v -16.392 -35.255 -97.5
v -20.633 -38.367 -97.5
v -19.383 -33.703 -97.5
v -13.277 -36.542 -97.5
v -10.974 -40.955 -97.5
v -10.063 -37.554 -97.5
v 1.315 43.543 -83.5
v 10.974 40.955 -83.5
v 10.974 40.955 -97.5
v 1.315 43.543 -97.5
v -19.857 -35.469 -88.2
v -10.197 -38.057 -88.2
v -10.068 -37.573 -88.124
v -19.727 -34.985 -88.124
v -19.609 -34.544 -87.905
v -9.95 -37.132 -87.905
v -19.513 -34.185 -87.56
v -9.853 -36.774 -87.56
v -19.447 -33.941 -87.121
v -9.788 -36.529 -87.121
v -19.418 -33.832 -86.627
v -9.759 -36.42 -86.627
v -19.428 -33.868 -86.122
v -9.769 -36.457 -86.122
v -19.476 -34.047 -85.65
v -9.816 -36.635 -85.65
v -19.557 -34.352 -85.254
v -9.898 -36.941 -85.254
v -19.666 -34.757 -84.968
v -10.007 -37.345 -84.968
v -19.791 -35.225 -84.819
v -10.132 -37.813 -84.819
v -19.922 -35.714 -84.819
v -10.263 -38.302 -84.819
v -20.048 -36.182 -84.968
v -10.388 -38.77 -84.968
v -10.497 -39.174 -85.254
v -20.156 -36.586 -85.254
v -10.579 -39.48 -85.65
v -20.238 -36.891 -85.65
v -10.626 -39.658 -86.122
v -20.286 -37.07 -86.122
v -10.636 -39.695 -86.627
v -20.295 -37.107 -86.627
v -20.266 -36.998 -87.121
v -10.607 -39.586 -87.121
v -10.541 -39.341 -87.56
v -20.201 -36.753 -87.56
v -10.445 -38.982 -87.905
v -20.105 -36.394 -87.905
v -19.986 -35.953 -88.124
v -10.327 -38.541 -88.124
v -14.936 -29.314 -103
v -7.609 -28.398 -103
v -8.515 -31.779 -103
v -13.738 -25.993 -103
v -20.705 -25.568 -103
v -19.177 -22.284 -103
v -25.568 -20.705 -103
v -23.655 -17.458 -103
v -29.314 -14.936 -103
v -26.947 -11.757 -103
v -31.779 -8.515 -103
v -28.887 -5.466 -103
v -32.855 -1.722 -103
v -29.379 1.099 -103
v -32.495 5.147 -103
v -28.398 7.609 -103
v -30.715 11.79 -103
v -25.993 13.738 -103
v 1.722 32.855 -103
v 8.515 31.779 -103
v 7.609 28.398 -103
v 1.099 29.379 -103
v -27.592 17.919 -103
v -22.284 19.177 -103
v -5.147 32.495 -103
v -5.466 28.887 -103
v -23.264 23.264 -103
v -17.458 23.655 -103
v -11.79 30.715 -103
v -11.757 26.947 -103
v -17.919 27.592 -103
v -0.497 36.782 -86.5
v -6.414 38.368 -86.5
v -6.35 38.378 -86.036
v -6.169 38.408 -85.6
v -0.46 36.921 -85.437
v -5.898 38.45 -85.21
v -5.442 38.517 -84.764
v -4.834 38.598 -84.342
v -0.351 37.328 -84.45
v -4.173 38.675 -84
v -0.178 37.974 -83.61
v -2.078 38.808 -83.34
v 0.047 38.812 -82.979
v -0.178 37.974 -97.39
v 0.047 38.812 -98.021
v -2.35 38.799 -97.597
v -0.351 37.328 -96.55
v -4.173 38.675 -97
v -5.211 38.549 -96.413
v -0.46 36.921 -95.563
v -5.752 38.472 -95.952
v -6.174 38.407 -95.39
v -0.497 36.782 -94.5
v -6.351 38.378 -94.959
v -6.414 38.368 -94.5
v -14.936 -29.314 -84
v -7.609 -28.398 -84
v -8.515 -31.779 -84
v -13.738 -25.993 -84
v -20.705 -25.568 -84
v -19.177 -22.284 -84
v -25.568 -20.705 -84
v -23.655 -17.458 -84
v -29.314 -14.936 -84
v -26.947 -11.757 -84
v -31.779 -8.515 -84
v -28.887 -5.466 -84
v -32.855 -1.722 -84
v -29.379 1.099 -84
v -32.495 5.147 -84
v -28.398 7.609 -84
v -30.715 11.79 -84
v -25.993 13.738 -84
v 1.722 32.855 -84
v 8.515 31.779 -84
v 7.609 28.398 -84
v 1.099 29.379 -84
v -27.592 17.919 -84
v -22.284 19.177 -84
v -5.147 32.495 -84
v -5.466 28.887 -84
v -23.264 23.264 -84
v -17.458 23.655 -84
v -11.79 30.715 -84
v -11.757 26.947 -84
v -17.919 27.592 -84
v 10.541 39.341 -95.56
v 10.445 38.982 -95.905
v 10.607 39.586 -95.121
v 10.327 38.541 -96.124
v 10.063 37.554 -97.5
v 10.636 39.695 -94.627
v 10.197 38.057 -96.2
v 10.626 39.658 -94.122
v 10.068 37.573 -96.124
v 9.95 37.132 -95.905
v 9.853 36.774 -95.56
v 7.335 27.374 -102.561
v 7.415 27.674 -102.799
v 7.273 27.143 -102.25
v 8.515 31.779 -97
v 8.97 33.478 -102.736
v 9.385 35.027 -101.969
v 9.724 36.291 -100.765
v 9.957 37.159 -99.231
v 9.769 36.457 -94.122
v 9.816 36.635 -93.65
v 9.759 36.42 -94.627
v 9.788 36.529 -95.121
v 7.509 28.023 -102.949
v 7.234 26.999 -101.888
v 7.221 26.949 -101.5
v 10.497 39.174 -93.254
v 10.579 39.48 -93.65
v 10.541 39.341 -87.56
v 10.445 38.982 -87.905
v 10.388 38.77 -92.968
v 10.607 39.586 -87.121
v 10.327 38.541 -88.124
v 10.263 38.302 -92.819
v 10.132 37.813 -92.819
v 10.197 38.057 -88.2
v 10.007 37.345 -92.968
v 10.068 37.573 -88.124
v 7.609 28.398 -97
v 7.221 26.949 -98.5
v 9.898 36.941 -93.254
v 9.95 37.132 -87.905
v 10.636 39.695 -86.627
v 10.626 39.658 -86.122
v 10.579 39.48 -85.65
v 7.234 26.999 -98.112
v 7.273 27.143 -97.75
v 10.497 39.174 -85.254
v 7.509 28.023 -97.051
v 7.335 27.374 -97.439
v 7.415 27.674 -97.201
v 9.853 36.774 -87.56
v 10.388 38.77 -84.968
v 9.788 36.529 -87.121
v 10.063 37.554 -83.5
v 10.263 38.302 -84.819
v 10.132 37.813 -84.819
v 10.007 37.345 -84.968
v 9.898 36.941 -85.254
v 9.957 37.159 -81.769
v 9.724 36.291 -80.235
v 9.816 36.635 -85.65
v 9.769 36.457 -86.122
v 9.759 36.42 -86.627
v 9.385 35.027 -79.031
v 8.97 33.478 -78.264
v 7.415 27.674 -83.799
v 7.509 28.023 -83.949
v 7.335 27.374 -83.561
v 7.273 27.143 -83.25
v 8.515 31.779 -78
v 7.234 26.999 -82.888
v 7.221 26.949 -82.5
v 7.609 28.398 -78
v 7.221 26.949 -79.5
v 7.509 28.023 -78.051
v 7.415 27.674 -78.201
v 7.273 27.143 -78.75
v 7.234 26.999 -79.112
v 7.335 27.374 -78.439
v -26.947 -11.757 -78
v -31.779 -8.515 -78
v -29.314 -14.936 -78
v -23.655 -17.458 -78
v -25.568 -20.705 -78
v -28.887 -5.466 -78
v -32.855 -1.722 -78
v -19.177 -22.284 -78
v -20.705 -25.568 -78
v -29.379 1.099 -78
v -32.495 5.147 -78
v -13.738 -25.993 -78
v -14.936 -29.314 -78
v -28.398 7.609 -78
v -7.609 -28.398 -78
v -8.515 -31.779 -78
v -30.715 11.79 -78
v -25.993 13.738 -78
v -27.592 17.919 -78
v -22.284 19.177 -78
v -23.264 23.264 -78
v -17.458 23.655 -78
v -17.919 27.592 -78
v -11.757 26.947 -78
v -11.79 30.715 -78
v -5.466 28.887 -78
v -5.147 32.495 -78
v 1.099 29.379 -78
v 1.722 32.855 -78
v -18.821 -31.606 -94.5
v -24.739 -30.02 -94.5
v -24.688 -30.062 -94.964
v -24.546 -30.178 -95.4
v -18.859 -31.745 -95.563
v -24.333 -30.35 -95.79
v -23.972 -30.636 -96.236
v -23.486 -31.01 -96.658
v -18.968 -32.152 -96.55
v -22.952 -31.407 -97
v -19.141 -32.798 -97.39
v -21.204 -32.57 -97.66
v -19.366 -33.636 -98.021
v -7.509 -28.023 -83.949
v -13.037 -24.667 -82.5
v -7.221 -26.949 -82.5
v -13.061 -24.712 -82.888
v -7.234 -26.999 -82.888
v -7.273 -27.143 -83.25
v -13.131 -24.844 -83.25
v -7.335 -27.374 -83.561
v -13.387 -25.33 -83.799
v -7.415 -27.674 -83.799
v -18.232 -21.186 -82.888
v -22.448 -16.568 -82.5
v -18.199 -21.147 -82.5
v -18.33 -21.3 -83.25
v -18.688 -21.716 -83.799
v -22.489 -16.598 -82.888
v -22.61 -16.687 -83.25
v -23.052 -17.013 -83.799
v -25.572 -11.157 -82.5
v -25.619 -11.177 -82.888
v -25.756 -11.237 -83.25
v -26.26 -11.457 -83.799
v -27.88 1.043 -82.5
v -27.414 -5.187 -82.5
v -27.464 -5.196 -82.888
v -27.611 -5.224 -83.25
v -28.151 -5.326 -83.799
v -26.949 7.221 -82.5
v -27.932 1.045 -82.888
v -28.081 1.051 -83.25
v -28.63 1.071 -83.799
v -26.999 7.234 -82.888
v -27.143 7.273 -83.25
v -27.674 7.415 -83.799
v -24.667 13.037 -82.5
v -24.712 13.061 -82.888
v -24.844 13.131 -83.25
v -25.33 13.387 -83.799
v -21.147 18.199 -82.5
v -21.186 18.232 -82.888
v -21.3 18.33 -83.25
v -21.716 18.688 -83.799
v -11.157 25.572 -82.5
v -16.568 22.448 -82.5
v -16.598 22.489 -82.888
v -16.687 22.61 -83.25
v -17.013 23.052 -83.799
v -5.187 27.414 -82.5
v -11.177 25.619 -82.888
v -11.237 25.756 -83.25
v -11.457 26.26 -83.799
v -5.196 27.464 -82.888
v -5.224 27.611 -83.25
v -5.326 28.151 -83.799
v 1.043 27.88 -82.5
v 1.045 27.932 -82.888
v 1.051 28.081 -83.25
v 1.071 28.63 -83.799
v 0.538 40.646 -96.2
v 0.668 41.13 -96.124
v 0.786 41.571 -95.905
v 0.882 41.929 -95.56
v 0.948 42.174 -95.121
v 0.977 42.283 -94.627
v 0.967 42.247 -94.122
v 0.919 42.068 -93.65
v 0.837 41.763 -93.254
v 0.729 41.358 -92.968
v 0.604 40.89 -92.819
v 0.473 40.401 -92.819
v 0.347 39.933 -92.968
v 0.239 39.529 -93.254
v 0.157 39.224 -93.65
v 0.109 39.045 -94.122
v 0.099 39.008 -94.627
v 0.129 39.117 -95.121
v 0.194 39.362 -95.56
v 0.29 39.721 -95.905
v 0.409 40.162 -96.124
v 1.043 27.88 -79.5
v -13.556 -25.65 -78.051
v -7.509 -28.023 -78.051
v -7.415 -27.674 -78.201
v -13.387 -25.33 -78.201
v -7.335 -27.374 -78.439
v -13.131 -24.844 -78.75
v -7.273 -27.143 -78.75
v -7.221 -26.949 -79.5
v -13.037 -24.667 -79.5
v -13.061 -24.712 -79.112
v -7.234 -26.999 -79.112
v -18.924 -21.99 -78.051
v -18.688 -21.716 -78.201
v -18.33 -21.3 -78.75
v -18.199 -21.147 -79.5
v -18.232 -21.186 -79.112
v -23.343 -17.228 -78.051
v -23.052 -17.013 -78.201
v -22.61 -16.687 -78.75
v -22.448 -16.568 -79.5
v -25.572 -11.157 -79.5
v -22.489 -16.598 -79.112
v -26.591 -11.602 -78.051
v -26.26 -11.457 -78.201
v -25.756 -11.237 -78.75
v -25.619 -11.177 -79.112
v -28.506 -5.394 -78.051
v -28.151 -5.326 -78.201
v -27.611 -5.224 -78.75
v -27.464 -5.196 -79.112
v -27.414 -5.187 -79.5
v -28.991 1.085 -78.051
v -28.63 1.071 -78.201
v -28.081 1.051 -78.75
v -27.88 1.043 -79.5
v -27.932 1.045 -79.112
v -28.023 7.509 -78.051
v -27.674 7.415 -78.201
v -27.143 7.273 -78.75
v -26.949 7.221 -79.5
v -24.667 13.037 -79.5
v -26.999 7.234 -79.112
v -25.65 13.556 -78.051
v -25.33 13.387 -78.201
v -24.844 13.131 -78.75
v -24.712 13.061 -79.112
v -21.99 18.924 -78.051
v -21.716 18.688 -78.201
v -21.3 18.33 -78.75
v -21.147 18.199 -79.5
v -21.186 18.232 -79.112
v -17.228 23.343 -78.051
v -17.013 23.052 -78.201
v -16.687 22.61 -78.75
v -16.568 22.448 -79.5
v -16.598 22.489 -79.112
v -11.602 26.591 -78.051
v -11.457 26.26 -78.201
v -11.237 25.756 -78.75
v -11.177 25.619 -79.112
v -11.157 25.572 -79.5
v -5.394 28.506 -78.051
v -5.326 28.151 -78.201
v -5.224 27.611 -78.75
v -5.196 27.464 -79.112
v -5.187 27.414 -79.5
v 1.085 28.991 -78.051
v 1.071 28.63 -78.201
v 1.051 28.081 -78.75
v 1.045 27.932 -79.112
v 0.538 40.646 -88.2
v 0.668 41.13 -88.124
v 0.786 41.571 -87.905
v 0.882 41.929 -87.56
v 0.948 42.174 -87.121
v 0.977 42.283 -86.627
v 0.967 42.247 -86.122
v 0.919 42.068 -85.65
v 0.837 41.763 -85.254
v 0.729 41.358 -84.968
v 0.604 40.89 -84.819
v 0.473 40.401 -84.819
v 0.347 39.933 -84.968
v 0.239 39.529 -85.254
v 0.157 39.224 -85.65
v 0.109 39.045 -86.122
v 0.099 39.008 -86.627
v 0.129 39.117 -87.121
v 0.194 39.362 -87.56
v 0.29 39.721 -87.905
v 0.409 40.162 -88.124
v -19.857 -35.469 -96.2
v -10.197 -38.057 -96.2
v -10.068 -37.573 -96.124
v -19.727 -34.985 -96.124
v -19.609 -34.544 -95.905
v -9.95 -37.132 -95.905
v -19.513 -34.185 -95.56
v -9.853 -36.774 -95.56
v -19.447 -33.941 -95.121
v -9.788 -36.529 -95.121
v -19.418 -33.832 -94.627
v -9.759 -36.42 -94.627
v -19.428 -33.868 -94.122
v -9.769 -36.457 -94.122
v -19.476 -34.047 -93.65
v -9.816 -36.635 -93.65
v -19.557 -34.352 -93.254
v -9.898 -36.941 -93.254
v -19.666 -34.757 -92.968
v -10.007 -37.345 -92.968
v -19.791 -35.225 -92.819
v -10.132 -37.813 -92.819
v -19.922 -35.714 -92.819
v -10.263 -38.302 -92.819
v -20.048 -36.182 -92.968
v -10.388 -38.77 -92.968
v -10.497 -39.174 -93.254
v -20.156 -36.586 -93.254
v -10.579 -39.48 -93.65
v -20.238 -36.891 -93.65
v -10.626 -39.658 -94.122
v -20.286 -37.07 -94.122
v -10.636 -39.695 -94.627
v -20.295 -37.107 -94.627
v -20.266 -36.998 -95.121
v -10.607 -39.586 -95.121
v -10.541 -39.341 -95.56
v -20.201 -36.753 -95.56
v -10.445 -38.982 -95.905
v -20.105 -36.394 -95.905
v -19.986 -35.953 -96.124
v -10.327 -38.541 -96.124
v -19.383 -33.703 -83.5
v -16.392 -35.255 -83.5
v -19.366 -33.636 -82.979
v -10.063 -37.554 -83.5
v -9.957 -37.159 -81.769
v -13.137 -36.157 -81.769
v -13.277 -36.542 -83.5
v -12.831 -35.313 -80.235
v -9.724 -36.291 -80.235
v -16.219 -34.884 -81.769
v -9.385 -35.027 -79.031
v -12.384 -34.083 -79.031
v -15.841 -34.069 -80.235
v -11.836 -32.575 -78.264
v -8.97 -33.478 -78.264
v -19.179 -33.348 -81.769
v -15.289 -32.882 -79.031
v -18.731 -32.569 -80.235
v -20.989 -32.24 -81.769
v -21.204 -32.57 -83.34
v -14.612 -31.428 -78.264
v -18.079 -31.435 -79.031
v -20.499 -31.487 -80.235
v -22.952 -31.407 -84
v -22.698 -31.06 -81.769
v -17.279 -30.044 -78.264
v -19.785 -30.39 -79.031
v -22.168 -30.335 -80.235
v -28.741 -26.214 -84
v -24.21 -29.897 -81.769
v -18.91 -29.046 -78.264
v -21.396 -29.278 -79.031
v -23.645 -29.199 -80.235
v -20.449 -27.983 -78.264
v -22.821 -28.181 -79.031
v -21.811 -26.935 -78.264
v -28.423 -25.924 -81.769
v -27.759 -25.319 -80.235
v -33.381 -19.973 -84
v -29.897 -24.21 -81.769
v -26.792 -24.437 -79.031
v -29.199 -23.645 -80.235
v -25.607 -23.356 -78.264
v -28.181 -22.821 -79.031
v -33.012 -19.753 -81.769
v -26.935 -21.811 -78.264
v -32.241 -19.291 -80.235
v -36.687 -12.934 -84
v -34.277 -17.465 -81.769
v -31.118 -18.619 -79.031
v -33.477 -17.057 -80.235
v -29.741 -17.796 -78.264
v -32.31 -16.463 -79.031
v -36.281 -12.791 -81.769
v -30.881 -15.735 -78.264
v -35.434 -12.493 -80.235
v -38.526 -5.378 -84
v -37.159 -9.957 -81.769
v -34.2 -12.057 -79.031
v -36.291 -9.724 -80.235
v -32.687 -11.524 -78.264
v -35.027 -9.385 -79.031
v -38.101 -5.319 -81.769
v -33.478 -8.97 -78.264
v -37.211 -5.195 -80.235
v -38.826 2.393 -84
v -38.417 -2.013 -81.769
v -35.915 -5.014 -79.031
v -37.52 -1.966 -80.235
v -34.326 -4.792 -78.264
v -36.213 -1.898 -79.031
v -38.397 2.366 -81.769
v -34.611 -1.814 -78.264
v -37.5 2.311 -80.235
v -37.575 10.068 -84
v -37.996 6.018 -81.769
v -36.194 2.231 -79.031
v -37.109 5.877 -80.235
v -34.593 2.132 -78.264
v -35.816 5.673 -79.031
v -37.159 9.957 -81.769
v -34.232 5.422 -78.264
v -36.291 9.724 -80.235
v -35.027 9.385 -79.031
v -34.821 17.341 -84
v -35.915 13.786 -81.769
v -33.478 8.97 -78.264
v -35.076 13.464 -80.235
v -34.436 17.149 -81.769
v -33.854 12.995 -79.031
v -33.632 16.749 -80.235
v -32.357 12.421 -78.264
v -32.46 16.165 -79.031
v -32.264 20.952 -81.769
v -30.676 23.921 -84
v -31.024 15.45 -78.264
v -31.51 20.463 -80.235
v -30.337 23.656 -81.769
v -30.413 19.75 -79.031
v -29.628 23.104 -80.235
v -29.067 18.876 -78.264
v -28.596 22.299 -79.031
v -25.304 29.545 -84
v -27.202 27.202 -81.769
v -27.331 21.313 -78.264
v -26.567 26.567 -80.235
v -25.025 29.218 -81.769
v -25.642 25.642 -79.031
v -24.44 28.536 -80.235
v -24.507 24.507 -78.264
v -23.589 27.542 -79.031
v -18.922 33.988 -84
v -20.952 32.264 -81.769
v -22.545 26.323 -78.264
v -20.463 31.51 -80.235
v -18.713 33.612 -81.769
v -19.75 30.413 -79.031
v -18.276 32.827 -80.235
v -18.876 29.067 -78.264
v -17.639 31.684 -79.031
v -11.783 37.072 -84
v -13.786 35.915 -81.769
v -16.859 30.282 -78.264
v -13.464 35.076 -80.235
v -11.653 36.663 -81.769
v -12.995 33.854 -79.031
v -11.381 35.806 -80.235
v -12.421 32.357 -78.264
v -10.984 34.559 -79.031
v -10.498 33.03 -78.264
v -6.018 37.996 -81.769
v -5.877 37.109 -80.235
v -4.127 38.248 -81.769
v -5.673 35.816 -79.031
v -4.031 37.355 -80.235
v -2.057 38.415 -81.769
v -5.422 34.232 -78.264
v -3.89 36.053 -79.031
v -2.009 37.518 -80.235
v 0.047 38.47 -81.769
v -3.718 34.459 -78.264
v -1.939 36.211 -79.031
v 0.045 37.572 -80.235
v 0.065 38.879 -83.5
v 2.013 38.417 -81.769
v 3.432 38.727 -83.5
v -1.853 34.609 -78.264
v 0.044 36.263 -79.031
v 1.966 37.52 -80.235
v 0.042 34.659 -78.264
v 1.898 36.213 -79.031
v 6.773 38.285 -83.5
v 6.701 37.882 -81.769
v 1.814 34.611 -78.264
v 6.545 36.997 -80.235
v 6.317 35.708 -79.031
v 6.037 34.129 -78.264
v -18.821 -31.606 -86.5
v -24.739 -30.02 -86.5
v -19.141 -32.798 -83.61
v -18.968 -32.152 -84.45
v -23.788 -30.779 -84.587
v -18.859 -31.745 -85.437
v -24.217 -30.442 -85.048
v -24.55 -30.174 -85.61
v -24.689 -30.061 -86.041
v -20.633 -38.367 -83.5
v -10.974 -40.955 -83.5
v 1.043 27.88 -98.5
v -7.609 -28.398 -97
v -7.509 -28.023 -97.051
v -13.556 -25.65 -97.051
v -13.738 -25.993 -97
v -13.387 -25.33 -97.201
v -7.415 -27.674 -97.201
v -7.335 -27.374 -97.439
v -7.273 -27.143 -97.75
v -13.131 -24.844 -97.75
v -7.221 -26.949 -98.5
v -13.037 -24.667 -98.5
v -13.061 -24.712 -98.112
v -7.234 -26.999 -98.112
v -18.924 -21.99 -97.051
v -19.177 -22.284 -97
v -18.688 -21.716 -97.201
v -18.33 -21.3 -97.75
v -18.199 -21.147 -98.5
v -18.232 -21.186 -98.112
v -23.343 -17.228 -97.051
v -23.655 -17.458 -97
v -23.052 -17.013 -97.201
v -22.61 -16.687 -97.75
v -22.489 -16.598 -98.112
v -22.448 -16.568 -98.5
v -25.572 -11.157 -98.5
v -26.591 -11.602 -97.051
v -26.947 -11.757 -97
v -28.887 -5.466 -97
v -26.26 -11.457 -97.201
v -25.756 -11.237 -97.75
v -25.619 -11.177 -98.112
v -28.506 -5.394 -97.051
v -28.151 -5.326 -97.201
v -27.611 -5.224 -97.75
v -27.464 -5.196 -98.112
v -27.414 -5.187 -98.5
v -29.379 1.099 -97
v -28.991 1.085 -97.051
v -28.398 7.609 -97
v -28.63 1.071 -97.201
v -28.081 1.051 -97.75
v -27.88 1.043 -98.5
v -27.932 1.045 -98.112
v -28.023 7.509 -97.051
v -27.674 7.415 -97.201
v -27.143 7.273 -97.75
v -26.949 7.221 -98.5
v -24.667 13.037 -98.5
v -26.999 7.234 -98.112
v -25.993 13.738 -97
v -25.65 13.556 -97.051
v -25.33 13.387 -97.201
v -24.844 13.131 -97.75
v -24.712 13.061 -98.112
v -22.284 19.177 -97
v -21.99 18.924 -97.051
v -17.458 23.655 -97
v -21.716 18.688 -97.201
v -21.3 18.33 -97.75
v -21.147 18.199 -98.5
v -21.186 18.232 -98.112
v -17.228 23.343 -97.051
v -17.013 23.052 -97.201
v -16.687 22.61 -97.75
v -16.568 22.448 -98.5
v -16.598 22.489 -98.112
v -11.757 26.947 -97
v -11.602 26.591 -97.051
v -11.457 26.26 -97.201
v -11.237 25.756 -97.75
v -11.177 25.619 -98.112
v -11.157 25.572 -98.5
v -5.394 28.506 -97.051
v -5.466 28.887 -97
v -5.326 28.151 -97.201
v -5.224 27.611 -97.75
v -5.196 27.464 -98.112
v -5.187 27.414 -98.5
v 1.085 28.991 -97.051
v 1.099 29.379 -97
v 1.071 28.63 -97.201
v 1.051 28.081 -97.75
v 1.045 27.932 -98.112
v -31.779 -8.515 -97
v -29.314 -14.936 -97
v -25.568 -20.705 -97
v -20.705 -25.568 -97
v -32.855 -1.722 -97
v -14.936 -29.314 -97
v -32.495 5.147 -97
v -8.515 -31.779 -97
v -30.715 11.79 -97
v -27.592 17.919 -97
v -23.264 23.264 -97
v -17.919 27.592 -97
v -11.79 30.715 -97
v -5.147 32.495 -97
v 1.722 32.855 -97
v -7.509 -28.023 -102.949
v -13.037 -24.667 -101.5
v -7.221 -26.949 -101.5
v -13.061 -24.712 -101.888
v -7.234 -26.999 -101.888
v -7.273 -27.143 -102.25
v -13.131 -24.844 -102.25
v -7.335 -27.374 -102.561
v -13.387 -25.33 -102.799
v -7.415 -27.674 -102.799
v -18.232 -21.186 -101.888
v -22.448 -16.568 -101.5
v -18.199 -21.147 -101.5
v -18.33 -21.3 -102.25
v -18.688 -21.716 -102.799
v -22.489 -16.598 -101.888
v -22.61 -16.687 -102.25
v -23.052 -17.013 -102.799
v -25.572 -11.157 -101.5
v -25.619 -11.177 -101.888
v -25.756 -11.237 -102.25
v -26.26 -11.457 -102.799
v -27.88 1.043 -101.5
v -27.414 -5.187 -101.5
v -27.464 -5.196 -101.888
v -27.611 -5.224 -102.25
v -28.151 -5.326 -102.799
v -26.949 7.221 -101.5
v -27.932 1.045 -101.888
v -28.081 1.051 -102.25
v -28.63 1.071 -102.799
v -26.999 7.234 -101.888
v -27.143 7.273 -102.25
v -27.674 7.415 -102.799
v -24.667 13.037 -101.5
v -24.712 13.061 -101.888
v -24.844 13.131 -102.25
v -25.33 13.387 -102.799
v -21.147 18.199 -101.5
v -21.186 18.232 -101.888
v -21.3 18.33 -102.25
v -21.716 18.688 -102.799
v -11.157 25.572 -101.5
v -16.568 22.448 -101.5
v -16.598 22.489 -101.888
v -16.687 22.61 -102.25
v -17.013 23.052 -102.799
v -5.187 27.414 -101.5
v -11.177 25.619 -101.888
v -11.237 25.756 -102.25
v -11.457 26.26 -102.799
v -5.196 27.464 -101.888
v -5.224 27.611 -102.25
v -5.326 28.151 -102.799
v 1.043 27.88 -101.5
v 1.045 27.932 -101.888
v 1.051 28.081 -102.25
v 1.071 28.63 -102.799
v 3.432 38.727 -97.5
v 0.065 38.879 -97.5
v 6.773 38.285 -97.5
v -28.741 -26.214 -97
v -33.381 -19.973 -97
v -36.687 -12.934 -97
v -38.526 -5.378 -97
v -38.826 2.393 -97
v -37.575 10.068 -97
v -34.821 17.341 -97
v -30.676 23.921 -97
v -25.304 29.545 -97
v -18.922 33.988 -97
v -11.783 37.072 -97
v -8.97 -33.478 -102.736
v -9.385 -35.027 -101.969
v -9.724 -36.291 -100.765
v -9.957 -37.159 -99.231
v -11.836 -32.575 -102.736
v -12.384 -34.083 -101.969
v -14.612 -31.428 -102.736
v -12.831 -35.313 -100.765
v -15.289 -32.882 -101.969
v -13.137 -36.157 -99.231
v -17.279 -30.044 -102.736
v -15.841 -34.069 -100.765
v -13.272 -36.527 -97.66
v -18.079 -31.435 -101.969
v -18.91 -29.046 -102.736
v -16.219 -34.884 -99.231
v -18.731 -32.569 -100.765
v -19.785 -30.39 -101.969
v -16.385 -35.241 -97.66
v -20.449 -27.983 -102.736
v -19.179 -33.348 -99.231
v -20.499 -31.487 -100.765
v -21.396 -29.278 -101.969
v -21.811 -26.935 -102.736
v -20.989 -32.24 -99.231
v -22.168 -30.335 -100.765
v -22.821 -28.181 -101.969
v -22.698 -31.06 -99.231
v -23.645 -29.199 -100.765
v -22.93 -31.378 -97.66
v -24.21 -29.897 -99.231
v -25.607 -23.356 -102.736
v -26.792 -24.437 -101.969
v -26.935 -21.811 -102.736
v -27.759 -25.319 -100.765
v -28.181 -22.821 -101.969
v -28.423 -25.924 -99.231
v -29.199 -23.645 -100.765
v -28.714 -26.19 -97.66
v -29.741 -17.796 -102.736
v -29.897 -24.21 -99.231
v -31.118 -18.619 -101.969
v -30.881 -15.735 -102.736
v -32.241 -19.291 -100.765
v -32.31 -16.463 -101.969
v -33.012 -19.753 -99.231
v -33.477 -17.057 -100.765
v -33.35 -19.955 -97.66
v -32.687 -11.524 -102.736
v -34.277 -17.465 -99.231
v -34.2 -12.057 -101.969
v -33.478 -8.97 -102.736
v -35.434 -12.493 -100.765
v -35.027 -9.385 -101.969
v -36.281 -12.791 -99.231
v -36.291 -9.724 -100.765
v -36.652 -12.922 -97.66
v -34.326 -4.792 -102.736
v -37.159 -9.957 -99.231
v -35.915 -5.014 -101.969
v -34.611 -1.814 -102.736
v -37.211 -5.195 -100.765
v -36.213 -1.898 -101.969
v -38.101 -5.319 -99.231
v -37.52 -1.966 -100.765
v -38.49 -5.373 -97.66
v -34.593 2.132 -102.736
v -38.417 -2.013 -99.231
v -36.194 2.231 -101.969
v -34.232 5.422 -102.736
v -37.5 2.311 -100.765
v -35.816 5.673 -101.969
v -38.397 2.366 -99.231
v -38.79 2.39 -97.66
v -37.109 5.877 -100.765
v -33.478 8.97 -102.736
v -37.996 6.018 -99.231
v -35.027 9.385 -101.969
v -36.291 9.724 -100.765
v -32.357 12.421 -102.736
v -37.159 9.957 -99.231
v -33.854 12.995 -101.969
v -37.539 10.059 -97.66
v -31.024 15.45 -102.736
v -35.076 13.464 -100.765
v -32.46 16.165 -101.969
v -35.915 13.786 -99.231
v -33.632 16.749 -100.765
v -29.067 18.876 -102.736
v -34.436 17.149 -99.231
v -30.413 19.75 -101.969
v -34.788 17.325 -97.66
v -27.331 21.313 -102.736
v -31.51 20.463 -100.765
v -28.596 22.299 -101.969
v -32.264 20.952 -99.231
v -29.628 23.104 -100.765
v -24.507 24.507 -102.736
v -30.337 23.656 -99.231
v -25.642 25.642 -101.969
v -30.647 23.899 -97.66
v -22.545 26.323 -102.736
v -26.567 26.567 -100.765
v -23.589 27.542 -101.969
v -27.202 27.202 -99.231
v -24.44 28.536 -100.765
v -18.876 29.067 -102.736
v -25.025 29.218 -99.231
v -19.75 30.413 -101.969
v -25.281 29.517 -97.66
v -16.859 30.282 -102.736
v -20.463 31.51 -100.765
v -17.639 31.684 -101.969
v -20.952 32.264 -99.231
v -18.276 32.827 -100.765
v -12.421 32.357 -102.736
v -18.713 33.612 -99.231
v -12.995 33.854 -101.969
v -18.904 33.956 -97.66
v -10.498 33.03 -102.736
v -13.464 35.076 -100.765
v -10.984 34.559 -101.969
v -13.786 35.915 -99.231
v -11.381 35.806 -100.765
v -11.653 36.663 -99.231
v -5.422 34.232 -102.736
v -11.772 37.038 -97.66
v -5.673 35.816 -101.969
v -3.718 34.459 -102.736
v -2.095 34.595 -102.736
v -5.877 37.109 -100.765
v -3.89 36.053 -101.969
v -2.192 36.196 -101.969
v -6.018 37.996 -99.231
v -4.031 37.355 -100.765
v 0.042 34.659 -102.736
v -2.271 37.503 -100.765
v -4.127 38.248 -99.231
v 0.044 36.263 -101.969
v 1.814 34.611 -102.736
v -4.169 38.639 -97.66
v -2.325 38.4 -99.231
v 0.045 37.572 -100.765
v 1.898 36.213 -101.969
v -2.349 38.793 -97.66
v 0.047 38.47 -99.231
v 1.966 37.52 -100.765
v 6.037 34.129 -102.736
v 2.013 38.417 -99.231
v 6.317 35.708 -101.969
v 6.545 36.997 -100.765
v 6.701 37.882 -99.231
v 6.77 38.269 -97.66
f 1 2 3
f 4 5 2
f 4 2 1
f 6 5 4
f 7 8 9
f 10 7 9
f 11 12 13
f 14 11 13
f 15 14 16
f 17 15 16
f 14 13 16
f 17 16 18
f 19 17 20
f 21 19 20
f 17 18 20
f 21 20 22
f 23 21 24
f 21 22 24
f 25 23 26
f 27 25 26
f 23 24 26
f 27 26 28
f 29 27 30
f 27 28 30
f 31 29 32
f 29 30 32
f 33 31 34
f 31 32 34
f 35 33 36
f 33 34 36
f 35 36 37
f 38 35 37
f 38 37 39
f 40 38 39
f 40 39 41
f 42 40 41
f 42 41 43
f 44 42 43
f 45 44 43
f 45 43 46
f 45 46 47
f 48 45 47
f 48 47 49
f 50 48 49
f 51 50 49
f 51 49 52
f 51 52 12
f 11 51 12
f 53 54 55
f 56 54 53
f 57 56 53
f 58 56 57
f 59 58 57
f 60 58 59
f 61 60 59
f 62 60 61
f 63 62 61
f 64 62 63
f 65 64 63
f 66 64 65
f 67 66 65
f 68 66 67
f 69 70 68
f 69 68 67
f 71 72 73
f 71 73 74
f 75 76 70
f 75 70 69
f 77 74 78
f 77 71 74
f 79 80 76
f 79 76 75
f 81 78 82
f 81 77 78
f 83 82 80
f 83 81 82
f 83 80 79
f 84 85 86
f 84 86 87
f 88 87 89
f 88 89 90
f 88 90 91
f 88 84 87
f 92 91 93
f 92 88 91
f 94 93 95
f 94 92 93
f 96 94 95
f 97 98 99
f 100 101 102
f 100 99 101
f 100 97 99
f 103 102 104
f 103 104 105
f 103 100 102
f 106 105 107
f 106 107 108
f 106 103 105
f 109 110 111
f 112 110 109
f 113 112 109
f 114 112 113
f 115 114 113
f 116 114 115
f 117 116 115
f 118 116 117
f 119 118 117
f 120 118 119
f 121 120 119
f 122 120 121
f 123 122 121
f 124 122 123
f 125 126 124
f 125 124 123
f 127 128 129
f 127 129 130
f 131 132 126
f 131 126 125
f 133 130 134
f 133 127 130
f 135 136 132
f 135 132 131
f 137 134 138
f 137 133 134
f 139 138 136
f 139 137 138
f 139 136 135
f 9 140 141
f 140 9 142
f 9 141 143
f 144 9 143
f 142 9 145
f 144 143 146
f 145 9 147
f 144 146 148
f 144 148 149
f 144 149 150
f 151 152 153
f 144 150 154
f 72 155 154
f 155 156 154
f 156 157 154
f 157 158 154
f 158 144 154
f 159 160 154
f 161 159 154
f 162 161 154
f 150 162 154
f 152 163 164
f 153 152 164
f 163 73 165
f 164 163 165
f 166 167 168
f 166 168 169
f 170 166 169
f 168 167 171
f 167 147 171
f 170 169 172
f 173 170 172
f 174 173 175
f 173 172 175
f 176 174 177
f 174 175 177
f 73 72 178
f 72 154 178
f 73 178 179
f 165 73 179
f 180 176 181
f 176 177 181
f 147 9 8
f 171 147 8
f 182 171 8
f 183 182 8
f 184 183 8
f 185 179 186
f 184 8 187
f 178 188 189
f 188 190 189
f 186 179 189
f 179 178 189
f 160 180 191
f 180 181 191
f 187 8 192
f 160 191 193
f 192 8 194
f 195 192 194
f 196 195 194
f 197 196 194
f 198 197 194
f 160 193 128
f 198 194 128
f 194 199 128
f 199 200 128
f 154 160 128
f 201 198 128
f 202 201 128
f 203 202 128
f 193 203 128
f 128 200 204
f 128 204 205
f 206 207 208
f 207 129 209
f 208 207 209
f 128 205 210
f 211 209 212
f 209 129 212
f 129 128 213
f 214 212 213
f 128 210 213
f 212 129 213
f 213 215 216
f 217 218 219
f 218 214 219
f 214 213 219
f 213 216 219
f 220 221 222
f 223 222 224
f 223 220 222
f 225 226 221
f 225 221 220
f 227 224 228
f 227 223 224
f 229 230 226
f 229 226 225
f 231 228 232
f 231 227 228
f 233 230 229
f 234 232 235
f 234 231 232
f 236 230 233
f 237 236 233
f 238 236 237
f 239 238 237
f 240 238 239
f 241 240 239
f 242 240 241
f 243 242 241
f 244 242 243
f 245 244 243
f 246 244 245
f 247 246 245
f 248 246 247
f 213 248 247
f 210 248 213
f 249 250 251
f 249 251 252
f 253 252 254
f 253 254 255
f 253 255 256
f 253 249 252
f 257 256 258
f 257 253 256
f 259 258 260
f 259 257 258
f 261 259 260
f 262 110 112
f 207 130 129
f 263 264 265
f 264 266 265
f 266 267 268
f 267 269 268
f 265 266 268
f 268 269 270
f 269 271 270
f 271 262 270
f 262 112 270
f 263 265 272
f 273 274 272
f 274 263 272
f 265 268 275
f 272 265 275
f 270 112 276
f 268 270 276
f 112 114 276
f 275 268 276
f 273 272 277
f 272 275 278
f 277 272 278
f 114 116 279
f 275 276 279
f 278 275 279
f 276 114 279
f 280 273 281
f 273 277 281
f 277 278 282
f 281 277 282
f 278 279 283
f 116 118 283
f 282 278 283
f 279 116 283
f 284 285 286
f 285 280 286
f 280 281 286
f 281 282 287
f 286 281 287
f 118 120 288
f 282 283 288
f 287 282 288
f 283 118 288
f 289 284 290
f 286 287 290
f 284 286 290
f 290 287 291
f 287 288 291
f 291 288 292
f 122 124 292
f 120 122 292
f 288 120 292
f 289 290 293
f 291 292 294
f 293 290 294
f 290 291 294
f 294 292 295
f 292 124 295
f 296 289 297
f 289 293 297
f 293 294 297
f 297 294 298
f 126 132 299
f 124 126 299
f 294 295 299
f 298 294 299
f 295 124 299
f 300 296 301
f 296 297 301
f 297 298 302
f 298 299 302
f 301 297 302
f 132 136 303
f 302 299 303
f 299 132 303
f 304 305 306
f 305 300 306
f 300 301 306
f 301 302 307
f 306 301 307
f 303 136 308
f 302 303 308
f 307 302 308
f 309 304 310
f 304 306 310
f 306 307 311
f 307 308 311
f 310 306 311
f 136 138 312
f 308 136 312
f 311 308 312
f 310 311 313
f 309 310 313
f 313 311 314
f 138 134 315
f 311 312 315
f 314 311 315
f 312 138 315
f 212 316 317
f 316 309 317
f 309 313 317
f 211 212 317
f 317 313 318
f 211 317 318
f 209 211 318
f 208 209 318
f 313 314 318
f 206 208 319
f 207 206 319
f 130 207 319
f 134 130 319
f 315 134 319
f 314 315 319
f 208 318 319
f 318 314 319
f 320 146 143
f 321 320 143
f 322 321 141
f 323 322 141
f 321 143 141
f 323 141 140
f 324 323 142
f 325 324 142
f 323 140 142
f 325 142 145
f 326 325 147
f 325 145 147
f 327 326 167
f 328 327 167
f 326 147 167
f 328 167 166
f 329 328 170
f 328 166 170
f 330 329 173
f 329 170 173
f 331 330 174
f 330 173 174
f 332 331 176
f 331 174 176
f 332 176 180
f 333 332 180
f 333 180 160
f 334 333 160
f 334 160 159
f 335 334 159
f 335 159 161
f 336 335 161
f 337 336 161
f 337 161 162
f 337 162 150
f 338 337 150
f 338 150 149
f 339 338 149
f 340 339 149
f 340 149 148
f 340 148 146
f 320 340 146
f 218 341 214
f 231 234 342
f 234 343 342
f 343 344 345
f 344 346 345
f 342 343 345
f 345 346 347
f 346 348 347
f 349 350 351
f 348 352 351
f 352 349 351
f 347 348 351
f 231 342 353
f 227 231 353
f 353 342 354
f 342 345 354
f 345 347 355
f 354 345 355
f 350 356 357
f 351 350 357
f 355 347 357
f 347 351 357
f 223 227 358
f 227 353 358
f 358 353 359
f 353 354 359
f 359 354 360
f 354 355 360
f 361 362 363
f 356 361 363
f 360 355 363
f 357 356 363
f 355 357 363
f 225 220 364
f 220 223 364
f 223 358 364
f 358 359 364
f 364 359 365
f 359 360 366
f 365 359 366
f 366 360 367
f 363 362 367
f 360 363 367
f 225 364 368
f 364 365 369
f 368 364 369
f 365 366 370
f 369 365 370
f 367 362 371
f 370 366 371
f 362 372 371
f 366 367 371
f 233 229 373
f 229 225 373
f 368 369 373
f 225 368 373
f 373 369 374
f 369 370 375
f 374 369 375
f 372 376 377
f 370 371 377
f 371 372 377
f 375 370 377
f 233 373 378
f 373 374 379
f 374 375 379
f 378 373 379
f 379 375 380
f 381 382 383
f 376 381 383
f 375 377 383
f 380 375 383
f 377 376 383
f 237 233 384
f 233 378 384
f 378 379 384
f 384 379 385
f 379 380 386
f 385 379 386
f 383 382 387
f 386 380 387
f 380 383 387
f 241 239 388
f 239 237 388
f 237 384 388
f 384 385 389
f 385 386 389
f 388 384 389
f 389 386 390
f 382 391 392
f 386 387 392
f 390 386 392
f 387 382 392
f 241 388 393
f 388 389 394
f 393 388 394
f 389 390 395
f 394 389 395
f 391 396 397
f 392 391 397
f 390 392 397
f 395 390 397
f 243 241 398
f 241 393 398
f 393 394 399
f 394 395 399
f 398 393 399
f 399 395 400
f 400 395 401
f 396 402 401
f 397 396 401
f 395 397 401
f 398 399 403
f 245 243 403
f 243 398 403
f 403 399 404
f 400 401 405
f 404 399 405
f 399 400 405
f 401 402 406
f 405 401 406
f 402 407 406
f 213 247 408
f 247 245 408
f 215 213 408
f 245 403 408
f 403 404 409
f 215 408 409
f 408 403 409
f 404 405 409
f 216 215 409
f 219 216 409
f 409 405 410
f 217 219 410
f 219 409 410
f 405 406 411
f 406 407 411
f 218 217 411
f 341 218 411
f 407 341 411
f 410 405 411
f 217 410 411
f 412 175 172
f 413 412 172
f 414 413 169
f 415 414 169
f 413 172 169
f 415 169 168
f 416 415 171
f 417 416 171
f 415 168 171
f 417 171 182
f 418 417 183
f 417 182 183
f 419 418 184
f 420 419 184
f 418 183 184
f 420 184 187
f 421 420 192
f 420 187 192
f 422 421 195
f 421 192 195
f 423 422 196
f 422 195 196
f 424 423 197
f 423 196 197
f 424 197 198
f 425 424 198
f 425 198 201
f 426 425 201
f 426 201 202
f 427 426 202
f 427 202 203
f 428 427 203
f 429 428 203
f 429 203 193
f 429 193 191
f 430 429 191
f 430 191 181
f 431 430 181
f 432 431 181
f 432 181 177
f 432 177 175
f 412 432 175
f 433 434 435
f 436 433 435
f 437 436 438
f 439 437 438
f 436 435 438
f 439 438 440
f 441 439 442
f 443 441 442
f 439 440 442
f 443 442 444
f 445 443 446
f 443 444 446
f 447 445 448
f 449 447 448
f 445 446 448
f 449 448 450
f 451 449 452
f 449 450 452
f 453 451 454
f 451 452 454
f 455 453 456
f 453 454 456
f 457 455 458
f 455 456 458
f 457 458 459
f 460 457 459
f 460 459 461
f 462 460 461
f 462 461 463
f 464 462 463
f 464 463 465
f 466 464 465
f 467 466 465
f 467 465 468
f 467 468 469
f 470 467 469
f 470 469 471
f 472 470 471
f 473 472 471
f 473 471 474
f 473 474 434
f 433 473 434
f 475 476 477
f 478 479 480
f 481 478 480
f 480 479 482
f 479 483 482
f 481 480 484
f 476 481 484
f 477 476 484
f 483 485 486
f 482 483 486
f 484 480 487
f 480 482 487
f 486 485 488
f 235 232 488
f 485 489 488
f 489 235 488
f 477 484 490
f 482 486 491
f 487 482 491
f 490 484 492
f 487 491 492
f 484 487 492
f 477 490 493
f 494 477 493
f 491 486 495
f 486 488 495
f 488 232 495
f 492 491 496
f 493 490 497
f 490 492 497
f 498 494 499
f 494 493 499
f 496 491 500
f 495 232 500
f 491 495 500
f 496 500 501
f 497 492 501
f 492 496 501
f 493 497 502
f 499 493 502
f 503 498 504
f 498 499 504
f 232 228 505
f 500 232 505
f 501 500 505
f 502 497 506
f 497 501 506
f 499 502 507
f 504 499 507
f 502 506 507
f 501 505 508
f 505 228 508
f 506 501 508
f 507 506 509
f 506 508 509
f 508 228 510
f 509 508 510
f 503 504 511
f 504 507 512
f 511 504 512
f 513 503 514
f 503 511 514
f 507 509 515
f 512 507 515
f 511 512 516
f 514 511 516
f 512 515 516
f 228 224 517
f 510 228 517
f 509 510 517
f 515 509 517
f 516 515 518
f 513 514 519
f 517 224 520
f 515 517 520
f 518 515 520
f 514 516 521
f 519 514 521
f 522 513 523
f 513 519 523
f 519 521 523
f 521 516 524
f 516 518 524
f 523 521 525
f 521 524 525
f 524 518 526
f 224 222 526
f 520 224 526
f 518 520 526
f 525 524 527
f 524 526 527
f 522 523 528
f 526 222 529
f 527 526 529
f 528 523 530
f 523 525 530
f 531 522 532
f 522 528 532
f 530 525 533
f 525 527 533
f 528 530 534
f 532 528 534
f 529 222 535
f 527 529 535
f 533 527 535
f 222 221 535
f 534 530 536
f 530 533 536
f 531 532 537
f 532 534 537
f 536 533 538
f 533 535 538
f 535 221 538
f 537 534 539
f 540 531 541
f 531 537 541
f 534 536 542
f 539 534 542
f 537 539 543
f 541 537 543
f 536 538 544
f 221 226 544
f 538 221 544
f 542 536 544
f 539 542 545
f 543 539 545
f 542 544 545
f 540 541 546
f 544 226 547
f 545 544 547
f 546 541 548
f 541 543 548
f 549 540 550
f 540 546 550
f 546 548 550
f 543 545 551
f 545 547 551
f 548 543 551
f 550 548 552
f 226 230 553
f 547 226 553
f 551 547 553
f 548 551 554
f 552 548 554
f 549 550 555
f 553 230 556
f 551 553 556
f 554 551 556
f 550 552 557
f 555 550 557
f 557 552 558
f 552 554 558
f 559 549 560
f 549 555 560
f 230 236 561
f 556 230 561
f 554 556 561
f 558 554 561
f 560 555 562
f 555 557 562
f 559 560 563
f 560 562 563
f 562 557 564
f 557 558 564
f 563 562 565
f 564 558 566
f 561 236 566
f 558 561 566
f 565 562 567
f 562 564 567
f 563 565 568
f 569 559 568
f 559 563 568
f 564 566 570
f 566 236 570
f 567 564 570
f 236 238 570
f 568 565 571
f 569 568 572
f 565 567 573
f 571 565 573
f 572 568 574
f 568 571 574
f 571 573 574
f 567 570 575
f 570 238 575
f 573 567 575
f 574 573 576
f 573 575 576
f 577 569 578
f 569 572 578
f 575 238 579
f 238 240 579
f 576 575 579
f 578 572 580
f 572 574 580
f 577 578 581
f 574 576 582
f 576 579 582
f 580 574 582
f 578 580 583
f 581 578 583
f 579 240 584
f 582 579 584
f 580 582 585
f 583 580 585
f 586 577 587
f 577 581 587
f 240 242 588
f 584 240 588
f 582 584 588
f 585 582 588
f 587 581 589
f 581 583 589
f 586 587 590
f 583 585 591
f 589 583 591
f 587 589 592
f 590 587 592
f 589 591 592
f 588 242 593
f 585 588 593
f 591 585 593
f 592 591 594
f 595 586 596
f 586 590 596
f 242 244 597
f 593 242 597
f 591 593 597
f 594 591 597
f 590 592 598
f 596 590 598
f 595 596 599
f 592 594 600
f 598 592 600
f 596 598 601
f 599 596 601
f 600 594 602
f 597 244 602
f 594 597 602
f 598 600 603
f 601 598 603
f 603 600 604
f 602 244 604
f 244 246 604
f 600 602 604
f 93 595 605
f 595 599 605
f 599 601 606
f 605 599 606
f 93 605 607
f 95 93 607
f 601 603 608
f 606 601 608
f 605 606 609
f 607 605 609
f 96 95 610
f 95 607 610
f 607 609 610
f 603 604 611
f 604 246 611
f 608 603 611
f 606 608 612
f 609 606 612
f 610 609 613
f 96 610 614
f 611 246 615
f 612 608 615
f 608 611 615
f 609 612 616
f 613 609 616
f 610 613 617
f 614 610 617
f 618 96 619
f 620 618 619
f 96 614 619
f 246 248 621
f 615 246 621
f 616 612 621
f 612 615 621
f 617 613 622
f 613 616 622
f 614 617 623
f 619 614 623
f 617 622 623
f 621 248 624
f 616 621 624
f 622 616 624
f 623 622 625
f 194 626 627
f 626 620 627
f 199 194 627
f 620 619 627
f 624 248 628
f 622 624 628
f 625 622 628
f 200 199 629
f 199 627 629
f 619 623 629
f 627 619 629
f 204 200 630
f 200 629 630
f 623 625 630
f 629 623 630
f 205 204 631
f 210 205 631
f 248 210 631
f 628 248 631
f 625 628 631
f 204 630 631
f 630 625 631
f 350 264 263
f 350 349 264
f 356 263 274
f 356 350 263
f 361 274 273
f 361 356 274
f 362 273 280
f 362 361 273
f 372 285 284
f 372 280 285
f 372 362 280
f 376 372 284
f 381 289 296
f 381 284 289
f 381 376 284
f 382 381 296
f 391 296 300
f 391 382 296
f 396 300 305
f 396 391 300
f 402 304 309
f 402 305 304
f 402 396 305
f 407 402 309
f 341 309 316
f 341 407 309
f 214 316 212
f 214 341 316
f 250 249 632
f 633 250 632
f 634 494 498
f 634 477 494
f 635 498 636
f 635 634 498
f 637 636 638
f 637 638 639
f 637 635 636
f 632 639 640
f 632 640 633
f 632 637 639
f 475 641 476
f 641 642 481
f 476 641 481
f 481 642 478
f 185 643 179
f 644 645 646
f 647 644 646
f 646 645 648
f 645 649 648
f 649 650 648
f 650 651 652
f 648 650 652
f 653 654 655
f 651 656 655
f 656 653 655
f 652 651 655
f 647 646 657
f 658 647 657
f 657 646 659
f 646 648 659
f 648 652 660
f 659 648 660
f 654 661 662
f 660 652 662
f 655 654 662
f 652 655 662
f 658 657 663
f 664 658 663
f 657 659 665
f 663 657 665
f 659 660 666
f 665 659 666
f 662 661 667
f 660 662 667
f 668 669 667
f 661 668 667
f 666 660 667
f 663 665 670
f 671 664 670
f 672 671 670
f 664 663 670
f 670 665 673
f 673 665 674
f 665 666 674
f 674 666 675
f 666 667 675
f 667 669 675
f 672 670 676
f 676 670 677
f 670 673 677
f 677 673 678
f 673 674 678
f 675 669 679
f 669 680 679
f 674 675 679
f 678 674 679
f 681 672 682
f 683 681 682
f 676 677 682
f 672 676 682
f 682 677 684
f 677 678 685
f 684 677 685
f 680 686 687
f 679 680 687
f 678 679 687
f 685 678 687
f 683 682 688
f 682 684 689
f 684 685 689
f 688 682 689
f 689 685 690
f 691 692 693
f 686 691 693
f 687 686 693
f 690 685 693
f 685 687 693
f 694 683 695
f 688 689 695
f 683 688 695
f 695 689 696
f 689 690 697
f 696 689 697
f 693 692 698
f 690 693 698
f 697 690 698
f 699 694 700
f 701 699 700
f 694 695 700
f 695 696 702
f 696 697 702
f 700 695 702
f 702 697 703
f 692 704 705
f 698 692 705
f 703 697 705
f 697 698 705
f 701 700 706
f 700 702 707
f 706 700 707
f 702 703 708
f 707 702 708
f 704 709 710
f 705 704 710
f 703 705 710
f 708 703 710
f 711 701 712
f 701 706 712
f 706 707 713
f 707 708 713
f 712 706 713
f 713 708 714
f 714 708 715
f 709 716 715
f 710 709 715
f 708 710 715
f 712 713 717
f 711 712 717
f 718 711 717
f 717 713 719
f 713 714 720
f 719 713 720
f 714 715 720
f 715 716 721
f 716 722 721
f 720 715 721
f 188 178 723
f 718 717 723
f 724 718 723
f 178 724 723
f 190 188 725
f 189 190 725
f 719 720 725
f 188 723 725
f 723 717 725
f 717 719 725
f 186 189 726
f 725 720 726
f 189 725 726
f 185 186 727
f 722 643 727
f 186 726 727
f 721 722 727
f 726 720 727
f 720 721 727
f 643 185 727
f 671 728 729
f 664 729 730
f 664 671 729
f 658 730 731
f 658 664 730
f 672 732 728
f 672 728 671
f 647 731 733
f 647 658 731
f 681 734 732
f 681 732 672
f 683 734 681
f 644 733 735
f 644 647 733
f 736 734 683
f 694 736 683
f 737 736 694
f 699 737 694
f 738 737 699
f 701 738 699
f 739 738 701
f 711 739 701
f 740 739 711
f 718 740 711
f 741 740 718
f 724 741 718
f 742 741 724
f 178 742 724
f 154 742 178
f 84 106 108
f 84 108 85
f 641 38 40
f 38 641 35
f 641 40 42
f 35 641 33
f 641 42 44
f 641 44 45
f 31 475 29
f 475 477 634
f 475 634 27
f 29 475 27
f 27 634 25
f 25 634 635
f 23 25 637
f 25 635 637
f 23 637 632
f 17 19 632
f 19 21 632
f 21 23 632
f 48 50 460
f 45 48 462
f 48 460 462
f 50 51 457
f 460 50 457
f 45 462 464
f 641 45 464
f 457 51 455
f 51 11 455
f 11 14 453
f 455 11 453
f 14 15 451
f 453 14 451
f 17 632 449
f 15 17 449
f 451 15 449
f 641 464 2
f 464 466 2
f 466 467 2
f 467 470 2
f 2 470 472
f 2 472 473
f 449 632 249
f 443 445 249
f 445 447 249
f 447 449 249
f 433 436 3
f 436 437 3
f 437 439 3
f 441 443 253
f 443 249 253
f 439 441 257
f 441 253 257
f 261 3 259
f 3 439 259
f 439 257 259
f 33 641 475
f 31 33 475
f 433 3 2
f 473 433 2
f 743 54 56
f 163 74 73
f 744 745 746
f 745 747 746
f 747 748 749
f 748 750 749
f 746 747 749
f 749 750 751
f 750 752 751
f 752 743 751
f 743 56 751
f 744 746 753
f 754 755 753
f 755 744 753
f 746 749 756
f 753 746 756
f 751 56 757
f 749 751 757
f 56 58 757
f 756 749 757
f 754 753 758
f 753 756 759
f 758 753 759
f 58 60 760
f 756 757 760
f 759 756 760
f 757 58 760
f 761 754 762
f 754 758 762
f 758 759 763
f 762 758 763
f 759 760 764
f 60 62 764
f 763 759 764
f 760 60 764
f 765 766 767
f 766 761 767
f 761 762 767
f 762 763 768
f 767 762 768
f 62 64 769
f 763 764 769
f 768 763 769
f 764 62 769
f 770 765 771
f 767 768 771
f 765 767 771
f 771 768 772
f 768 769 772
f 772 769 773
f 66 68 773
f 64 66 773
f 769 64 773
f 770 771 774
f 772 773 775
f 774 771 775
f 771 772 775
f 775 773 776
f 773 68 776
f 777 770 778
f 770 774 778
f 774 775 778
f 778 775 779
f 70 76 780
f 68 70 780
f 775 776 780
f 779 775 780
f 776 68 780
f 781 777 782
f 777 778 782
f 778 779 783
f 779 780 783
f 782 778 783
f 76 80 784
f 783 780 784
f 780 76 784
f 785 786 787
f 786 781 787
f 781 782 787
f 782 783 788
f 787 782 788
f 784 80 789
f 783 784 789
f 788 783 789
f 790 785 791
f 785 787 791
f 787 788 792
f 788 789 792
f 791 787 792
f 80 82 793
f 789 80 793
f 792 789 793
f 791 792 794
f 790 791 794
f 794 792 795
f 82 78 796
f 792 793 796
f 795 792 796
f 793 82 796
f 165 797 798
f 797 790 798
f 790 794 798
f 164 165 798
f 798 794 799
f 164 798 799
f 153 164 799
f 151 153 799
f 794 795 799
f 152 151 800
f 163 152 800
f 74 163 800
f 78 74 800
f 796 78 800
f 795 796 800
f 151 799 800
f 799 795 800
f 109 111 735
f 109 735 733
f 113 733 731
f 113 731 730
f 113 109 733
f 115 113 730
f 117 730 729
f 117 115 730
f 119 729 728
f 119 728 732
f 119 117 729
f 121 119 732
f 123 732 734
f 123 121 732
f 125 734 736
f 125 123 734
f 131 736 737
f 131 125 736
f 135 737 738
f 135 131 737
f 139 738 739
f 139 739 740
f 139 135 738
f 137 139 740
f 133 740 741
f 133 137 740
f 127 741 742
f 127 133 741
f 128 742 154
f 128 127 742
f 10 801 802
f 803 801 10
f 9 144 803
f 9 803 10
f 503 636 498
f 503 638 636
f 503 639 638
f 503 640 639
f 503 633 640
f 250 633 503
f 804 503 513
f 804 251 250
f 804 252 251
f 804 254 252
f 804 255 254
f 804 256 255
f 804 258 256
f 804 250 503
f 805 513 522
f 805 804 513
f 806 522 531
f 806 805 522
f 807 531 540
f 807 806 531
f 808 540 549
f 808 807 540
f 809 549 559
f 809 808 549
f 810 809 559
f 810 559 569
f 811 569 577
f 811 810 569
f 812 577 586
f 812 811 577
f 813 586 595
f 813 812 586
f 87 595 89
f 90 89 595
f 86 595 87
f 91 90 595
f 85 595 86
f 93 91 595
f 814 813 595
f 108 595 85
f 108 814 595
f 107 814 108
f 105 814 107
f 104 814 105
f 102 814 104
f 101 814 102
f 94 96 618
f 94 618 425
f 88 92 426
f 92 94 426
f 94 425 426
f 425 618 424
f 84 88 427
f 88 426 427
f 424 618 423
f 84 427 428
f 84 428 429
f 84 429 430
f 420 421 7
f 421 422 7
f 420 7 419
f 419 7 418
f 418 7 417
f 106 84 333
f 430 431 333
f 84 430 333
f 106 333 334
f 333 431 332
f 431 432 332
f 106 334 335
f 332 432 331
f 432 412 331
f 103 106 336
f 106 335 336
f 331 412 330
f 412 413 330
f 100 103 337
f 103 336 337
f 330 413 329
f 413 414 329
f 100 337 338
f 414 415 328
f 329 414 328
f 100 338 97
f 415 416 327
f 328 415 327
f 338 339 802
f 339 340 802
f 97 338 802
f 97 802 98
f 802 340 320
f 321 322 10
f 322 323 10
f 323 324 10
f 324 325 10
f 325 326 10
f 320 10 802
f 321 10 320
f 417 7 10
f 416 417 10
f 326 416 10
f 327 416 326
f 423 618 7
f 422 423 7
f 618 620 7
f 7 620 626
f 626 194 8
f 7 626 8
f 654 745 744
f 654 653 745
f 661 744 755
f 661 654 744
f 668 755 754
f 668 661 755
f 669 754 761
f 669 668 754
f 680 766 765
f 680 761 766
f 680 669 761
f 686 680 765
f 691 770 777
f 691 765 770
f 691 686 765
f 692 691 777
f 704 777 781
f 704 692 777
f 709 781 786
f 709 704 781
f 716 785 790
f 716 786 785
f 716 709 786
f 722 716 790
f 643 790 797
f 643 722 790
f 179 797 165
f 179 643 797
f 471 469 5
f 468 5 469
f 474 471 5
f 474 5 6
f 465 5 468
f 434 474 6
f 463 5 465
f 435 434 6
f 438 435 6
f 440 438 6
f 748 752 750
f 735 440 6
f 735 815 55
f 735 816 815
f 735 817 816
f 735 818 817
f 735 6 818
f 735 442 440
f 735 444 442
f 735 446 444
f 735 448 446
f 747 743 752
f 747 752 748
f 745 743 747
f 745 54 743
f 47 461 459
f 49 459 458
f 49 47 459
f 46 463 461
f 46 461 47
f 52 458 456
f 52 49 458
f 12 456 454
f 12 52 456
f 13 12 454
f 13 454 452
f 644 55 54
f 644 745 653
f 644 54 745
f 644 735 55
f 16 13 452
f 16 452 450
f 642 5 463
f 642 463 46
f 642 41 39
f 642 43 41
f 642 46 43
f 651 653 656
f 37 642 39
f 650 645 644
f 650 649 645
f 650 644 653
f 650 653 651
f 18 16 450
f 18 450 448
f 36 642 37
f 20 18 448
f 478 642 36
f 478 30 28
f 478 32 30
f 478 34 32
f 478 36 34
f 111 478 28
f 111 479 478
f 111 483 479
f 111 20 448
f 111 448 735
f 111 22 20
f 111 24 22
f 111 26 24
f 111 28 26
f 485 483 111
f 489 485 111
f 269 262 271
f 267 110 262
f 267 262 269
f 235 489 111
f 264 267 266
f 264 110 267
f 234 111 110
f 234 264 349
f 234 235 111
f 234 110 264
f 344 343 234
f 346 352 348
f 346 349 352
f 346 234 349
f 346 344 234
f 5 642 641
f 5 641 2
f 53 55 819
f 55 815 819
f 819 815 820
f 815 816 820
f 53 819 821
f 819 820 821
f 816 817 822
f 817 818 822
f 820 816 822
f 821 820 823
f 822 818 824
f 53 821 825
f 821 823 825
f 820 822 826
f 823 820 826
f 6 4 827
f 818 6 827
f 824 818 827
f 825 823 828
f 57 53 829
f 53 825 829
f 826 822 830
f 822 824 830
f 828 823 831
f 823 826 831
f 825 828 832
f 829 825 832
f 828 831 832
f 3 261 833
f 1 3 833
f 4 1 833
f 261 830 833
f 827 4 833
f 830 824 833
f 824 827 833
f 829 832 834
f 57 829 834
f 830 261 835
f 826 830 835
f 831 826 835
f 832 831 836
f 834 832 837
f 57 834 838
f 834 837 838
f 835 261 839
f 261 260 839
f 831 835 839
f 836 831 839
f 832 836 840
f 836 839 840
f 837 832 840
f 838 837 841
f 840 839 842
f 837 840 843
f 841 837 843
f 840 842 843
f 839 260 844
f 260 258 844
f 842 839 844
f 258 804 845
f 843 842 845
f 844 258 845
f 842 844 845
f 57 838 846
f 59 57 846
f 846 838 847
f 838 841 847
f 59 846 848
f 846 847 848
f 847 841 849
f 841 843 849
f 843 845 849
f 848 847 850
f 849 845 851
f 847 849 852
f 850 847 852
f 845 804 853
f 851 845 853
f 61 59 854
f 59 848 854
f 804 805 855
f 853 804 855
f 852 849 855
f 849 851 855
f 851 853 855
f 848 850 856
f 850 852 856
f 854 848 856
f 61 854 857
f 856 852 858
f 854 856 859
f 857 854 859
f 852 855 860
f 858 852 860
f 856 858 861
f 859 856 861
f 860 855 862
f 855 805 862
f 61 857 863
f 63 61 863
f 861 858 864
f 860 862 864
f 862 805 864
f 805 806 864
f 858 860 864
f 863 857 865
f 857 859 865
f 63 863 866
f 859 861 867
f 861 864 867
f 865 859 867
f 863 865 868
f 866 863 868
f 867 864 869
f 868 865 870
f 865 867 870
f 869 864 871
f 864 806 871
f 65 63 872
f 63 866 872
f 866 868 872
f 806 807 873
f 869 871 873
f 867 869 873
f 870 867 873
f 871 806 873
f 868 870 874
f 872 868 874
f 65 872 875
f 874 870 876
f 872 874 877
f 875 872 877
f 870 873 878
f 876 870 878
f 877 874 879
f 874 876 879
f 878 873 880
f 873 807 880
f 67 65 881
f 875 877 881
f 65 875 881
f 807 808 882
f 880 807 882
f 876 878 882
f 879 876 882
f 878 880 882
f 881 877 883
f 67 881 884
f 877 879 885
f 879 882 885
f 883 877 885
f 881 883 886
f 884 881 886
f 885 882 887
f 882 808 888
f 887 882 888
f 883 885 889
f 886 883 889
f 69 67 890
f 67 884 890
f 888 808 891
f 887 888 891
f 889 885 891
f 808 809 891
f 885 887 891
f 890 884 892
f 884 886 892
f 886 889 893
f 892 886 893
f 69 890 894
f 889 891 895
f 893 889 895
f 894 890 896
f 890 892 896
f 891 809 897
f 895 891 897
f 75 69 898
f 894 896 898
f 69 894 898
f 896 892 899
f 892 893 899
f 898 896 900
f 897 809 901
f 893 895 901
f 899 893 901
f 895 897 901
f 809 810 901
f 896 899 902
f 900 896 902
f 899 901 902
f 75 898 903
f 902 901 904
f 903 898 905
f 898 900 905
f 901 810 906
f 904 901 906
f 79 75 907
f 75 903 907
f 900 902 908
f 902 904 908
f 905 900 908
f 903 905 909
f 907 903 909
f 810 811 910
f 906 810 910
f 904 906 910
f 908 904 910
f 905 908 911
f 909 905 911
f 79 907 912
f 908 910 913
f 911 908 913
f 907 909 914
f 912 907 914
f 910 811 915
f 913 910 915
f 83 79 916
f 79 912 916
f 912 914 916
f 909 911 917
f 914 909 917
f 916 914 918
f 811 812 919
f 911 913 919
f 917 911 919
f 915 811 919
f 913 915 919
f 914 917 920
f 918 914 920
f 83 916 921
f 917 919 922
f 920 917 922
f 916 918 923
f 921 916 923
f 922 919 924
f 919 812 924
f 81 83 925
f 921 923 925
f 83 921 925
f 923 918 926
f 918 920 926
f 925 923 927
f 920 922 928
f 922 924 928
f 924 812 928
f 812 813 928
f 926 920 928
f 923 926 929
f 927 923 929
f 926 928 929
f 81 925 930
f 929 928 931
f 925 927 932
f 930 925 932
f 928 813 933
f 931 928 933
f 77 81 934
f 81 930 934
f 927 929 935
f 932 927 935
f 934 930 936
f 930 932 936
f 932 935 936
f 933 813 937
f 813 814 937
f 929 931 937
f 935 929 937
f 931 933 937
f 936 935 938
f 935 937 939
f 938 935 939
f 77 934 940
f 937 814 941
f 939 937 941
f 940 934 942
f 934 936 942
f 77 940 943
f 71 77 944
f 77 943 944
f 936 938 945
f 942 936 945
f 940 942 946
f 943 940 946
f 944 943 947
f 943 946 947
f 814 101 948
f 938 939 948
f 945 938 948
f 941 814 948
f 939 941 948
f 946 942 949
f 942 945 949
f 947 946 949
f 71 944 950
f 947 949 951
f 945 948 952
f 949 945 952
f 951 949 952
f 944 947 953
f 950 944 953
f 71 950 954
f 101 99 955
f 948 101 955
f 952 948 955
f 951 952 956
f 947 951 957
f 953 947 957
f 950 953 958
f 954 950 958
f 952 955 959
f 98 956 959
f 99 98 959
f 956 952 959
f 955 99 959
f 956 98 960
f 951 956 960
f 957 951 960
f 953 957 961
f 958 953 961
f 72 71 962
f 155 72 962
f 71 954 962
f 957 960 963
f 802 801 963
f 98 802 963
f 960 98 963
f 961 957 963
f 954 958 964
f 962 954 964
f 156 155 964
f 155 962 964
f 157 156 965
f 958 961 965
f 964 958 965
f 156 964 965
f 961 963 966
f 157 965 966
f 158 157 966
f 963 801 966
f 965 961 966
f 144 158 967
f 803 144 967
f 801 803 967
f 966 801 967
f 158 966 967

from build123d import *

# Parameters (mm, degrees)
REVOLUTION007_ANGLE     = 180
SKETCH064_W             = 14
SKETCH064_H             = 6
PAD026_DEPTH            = 10
SKETCH063_R             = 1.7
POCKET007_DEPTH         = 38.901
POCKET008_DEPTH         = 28.901
BODY015_PLACEMENT_ANGLE = 75


with BuildPart() as part:
    # Sketch062 → Revolution007 (revolve, symmetric)
    with BuildSketch(Plane.YZ) as revolution007_sk:
        with BuildLine():
            Line((32.9, 0), (32.9, 6.5))
            Line((32.9, 6.5), (29.4, 6.5))
            ThreePointArc((27.9, 8), (28.33934, 6.93934), (29.4, 6.5))
            Line((27.9, 8), (27.9, 11))
            ThreePointArc((29.4, 12.5), (28.33934, 12.06066), (27.9, 11))
            Line((29.4, 12.5), (32.9, 12.5))
            ThreePointArc((38.9, 6.5), (37.142641, 10.742641), (32.9, 12.5))
            Line((38.9, 6.5), (38.9, 0))
            Line((38.9, 0), (38.9, -6.5))
            ThreePointArc((32.9, -12.5), (37.142641, -10.742641), (38.9, -6.5))
            Line((32.9, -12.5), (29.4, -12.5))
            ThreePointArc((27.9, -11), (28.33934, -12.06066), (29.4, -12.5))
            Line((27.9, -11), (27.9, -8))
            ThreePointArc((29.4, -6.5), (28.33934, -6.93934), (27.9, -8))
            Line((29.4, -6.5), (32.9, -6.5))
            Line((32.9, -6.5), (32.9, 0))
        make_face()
    revolve(axis=Axis((0, 0, 0), (0, 0, 1)), revolution_arc=REVOLUTION007_ANGLE / 2)
    revolve(revolution007_sk.sketch, axis=Axis((0, 0, 0), (0, 0, -1)), revolution_arc=REVOLUTION007_ANGLE / 2)

    # Sketch064 (on Face18 of Revolution007) → Pad026 (new body)
    with BuildSketch(Plane(origin=(0, 0, 0), x_dir=(0, 0, -1), z_dir=(0, -1, 0))):
        with Locations((0, 39.4)):
            Rectangle(SKETCH064_W, SKETCH064_H)
        with Locations((0, -39.4)):
            Rectangle(SKETCH064_W, SKETCH064_H)
    extrude(amount=-PAD026_DEPTH)

    # Sketch063 (on Face18 of Revolution007) → Pocket007 (cut, through all)
    with BuildSketch(Plane(origin=(0, 0, 0), x_dir=(0, 0, -1), z_dir=(0, -1, 0))):
        with Locations((4, 39.4)):
            Circle(SKETCH063_R)
        with Locations((-4, 39.4)):
            Circle(SKETCH063_R)
        with Locations((-4, -39.4)):
            Circle(SKETCH063_R)
        with Locations((4, -39.4)):
            Circle(SKETCH063_R)
    extrude(amount=-POCKET007_DEPTH, mode=Mode.SUBTRACT)

    # Sketch065 (on Face22 of Pocket007) → Pocket008 (cut, through all)
    with BuildSketch(Plane.ZX.offset(10)):
        with BuildLine():
            Line((-4, 43.4), (4.000001, 43.4))
            ThreePointArc((4.000001, 35.4), (8, 39.4), (4.000001, 43.4))
            Line((-4, 35.4), (4.000001, 35.4))
            ThreePointArc((-4, 43.4), (-8, 39.4), (-4, 35.4))
        make_face()
        with BuildLine():
            Line((-4, -35.4), (4, -35.4))
            ThreePointArc((4, -43.4), (8, -39.4), (4, -35.4))
            Line((-4, -43.4), (4, -43.4))
            ThreePointArc((-4, -35.4), (-8, -39.4), (-4, -43.4))
        make_face()
    extrude(amount=POCKET008_DEPTH, mode=Mode.SUBTRACT)


with BuildPart() as part_1:
    # Body015 placement: moved
    add(part.part.moved(Location((0, 0, -90.5))).rotate(Axis((0, 0, -90.5), (0, 0, 1)), BODY015_PLACEMENT_ANGLE))


solid = part_1.part
